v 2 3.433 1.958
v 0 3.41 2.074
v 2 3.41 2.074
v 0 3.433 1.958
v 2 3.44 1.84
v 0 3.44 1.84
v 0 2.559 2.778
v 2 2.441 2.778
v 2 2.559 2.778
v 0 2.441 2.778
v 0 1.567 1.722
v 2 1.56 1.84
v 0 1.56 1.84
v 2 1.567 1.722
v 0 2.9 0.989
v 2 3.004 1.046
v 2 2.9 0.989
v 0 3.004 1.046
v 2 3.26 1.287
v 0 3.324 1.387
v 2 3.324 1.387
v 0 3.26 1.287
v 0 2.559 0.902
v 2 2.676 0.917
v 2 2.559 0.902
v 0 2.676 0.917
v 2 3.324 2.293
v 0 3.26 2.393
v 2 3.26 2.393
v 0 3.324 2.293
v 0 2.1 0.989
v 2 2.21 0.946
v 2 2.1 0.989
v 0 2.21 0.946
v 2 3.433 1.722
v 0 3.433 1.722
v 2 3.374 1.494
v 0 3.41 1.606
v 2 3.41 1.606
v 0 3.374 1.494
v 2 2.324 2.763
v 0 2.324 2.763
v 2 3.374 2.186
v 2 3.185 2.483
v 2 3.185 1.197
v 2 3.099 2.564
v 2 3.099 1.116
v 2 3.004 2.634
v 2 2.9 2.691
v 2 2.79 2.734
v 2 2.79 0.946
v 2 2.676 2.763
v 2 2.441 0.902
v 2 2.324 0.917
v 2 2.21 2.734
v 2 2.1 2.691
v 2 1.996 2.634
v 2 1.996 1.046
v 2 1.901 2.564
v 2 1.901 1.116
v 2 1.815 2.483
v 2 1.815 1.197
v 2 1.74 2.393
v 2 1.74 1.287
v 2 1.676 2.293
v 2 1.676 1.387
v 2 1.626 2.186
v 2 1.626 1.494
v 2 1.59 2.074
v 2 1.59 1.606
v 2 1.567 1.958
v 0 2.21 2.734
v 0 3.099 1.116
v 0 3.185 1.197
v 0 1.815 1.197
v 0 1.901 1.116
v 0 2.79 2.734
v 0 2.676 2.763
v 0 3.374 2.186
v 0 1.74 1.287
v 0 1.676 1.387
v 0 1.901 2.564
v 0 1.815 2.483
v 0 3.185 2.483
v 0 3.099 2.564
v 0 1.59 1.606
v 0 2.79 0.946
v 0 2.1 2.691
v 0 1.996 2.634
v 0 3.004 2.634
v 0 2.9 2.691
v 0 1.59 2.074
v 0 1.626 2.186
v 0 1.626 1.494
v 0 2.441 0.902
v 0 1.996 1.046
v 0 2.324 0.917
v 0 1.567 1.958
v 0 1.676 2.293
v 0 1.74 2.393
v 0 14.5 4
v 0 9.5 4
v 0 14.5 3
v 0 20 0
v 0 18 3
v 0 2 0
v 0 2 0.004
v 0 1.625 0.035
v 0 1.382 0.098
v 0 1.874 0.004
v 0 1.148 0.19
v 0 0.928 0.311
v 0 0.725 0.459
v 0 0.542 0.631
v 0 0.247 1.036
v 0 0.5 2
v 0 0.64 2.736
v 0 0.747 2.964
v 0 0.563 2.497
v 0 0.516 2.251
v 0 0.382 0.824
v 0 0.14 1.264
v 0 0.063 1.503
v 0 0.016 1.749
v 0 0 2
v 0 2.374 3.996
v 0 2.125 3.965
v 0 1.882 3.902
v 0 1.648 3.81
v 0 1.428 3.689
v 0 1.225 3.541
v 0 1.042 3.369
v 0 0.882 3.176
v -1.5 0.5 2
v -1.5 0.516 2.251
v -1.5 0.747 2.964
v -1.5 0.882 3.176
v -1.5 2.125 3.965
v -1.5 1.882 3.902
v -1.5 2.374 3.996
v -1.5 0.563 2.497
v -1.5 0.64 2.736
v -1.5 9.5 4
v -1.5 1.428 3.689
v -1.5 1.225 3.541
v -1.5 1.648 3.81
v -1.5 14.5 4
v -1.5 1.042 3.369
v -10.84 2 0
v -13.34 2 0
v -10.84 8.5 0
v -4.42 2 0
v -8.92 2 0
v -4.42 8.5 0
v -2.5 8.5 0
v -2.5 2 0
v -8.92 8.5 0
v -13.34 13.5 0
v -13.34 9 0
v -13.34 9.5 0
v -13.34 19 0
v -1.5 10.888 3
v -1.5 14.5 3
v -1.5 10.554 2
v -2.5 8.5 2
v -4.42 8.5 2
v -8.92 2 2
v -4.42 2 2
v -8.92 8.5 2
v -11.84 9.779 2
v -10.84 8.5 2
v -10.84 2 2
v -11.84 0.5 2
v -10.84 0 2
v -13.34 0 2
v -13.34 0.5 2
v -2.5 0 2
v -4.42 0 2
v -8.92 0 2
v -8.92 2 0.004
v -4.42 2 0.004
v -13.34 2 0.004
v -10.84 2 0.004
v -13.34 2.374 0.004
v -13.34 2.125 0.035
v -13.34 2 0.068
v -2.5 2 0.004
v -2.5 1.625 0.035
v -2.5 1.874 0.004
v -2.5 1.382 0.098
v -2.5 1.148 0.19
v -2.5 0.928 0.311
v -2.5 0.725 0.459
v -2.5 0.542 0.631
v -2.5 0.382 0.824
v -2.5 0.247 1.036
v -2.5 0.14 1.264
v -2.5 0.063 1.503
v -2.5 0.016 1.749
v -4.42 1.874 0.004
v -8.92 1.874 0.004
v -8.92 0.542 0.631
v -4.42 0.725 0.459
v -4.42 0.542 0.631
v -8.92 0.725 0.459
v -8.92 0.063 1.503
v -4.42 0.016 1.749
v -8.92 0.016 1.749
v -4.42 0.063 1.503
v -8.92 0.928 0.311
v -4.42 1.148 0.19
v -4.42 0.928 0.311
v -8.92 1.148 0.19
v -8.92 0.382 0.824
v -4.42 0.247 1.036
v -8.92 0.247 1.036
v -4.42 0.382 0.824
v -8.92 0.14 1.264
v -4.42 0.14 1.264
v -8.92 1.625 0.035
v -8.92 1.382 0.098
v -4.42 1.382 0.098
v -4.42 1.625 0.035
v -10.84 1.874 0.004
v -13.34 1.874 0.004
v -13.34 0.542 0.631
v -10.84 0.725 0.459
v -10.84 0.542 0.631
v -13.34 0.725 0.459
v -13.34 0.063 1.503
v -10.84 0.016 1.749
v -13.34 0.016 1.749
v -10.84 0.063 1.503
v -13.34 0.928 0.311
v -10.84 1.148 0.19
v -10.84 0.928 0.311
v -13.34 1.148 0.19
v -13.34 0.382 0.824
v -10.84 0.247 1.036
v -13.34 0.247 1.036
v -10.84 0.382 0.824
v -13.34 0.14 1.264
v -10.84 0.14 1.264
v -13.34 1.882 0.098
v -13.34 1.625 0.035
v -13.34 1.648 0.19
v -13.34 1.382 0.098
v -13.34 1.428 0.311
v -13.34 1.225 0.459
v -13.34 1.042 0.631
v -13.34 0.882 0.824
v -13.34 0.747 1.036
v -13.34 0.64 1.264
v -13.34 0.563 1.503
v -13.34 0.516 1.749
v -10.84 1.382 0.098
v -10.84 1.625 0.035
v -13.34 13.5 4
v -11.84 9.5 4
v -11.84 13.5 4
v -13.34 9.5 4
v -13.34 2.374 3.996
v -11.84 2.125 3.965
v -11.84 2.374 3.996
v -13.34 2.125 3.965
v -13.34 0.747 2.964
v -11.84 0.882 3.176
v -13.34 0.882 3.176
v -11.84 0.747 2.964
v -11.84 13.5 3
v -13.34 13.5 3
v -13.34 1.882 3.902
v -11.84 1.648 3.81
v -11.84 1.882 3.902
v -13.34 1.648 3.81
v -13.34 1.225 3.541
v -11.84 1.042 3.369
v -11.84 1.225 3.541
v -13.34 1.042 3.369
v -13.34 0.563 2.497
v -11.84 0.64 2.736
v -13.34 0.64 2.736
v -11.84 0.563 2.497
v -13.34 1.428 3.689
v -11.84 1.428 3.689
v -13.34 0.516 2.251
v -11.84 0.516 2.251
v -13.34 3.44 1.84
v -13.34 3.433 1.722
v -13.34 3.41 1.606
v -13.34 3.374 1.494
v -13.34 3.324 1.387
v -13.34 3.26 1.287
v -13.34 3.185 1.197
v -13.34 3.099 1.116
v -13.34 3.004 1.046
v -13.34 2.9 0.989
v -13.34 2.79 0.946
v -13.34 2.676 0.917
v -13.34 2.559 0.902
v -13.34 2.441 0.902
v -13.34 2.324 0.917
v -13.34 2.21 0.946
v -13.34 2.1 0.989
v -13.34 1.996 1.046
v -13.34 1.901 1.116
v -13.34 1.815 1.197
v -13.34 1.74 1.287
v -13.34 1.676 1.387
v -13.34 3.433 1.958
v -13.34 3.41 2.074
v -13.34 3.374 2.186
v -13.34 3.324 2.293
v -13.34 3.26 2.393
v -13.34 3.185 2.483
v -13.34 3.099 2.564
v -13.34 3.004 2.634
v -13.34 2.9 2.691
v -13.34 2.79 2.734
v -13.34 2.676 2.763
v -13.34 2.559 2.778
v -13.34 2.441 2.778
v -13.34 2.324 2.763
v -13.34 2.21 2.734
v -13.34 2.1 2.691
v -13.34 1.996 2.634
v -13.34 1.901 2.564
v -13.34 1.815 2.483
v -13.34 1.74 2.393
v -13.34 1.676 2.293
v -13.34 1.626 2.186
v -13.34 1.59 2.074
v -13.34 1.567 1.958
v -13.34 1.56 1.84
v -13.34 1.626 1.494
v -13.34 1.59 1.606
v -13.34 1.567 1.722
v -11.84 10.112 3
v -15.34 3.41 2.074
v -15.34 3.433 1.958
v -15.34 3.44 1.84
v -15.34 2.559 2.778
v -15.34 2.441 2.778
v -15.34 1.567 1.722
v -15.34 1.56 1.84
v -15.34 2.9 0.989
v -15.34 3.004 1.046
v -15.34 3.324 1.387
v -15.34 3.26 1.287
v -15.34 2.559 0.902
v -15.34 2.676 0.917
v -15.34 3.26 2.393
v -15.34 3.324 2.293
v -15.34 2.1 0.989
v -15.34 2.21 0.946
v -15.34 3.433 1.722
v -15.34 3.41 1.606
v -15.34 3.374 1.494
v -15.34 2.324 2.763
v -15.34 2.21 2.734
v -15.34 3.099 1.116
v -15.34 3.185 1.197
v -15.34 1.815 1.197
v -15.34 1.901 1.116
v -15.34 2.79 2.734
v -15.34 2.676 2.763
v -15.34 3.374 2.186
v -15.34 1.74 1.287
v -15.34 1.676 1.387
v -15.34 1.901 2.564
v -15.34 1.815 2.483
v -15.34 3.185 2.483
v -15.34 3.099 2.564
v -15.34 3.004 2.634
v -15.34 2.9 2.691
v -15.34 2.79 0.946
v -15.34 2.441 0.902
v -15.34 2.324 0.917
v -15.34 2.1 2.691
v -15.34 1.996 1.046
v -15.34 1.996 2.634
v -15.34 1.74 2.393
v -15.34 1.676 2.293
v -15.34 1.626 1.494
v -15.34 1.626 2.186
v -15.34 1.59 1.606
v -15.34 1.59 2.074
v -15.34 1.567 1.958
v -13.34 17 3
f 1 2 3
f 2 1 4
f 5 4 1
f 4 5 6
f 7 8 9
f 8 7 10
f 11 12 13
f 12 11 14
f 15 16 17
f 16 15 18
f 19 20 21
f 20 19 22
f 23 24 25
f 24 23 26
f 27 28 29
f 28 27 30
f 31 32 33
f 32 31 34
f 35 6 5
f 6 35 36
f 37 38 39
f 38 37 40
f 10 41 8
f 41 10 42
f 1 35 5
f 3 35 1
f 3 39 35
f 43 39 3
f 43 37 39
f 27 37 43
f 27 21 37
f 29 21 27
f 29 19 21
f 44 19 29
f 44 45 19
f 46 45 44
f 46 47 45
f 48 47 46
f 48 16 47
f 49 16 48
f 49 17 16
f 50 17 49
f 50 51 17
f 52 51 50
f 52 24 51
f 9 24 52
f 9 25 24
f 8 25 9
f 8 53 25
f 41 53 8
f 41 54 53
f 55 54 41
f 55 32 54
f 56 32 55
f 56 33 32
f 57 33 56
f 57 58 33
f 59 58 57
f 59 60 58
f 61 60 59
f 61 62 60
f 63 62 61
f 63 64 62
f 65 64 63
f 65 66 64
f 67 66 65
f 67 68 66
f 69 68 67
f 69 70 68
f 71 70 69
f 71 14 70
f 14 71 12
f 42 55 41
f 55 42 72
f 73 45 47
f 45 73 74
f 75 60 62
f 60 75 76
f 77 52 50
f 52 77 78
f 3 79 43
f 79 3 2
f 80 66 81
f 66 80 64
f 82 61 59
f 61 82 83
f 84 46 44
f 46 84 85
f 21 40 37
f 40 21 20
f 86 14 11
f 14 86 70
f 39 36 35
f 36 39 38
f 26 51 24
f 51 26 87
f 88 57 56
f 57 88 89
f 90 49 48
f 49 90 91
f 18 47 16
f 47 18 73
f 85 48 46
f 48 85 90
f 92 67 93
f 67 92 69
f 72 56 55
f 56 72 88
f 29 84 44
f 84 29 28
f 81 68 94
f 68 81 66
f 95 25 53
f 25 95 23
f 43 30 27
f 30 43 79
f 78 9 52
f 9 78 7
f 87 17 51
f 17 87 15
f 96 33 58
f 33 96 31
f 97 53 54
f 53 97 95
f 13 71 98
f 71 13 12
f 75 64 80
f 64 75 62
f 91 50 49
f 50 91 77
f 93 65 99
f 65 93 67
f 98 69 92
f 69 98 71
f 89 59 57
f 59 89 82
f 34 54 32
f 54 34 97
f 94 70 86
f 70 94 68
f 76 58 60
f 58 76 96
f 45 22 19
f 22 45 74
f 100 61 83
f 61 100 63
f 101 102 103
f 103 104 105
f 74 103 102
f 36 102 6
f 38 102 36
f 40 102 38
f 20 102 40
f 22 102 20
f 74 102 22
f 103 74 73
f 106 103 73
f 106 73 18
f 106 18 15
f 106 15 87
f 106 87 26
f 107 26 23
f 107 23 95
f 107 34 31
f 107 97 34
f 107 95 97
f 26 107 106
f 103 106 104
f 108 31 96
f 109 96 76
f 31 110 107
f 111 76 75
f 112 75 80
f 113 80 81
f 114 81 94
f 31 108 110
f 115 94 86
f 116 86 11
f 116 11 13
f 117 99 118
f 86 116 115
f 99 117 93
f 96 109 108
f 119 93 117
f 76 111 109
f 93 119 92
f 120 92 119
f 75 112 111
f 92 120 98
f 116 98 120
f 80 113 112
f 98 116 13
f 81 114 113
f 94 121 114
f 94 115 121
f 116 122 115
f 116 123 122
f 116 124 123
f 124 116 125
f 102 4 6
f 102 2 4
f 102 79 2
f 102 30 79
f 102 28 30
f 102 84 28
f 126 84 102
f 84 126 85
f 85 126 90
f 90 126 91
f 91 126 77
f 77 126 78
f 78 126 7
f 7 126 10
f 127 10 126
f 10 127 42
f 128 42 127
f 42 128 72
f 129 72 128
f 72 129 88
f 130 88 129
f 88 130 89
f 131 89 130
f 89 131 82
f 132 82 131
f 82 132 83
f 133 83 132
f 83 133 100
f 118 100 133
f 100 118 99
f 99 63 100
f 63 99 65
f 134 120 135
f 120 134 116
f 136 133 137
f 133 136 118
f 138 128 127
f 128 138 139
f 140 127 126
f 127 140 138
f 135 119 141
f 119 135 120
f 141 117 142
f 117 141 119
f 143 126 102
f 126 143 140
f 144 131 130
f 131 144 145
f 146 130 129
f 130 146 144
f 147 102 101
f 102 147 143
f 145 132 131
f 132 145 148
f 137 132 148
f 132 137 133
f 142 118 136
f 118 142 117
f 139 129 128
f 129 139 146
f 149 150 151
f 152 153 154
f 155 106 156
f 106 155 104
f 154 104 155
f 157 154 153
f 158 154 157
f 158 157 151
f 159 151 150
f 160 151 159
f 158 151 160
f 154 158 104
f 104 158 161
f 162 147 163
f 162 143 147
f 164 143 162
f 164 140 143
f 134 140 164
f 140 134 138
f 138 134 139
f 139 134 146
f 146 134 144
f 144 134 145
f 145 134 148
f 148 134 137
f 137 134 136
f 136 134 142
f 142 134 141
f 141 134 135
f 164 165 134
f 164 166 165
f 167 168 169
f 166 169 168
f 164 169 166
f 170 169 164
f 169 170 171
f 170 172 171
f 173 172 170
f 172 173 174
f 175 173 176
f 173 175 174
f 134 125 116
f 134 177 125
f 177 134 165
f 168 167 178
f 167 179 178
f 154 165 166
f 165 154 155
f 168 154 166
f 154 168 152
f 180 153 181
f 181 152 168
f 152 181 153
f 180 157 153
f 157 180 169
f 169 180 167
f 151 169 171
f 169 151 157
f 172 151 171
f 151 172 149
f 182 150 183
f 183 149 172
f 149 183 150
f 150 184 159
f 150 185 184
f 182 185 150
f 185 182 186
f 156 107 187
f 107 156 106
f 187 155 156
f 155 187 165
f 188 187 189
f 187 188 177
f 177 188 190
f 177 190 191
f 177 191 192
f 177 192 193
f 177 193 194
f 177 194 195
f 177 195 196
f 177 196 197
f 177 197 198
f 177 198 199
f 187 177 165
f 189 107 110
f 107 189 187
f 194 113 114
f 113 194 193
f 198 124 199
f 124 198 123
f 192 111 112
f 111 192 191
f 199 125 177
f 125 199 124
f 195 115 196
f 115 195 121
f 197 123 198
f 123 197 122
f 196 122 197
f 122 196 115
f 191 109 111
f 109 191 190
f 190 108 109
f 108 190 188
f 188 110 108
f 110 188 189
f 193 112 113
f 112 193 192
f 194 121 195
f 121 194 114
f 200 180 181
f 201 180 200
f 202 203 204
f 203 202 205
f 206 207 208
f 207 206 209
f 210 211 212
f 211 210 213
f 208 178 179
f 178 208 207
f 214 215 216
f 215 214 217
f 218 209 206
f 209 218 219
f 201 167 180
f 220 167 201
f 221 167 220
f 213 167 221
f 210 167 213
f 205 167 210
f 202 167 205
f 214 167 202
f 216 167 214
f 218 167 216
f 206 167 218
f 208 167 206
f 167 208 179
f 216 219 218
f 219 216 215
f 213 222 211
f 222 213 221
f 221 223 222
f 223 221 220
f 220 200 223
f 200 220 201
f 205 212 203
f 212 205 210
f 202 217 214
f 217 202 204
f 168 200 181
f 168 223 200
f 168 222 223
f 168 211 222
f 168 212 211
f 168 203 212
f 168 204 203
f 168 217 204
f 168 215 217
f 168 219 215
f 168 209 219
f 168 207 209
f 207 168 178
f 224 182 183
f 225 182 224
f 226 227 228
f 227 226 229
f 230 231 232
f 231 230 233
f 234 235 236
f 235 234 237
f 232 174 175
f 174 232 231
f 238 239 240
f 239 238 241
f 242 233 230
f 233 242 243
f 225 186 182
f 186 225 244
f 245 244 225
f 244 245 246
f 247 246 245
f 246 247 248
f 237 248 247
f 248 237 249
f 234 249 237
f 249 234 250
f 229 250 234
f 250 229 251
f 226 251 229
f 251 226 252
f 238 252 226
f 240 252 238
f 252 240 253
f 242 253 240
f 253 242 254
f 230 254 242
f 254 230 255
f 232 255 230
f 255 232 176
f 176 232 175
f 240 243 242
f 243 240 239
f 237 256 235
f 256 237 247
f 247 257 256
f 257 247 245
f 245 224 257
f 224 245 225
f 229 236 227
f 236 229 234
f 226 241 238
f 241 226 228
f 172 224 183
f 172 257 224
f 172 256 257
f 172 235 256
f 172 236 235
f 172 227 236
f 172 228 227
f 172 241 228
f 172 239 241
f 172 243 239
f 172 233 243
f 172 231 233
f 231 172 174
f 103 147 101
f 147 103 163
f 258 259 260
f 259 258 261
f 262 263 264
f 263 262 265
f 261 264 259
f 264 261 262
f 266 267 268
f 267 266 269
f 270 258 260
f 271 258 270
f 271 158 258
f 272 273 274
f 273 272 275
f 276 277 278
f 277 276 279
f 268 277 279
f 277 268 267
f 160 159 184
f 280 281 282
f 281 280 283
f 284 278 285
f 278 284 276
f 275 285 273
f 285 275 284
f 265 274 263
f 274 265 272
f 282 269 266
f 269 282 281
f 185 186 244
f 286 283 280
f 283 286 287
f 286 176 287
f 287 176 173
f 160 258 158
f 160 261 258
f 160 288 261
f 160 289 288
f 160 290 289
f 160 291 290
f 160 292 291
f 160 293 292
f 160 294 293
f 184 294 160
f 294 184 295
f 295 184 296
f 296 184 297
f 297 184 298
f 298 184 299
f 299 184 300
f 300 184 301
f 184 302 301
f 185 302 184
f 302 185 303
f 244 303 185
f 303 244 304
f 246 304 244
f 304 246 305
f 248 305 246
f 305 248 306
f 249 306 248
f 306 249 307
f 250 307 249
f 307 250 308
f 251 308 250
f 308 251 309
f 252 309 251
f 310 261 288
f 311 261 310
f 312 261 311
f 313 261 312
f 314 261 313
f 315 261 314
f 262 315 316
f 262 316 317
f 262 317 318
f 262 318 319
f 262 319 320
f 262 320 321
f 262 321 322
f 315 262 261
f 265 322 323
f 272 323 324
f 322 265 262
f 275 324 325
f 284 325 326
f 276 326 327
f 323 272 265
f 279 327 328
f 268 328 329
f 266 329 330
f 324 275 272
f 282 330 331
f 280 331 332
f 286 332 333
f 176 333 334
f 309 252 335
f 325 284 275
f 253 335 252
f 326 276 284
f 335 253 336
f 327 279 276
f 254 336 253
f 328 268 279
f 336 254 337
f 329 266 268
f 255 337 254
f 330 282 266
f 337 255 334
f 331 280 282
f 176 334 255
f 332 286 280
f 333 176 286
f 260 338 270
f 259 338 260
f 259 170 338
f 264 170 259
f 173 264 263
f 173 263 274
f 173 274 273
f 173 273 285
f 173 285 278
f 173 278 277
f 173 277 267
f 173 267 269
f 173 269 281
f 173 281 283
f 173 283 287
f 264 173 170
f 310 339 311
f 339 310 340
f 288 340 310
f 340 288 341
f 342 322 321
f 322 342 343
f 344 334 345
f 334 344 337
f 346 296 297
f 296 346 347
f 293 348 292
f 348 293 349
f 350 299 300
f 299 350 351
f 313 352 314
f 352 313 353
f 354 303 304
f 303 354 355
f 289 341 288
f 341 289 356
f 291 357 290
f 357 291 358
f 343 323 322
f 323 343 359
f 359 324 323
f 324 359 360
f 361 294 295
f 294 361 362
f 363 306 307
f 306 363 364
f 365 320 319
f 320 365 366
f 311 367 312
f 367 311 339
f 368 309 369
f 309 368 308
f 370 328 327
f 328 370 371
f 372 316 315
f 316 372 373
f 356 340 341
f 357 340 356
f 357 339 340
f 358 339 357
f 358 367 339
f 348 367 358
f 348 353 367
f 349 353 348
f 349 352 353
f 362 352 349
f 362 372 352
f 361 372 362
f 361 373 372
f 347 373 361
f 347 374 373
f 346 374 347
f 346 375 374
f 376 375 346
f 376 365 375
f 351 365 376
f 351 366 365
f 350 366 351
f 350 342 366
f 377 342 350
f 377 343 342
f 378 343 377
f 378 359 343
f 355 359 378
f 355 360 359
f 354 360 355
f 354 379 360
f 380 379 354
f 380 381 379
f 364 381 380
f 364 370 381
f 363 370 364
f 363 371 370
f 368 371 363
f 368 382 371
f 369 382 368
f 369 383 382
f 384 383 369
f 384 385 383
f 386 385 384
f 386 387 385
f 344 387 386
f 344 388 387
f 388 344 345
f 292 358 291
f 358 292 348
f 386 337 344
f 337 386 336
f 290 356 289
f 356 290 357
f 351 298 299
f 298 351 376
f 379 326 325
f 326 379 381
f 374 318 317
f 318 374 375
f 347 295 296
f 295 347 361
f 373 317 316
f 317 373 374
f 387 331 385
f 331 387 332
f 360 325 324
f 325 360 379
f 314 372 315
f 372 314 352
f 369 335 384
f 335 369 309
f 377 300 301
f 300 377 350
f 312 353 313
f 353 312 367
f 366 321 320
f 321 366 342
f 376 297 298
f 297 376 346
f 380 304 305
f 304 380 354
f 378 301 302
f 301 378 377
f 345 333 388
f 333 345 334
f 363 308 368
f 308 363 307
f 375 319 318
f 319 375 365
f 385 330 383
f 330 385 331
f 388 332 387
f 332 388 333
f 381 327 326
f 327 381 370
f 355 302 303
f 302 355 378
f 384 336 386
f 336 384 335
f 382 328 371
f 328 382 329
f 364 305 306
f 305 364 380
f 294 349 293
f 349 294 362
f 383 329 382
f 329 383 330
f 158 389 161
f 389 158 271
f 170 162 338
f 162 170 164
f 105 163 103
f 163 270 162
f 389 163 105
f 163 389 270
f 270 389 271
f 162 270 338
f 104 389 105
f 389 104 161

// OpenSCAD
// file: ../../../common/circle_sector.scad
module circle_sector(r = 0, d = 0, a = [0, 180]) {
    r = max(r, d / 2);
    sector_r = r / cos(180 / $fn);
    step = -360 / $fn;

    points = concat([[0, 0]],
        [for(a = [a[0] : step : a[1] - 360])
            [sector_r * cos(a), sector_r * sin(a)]
        ],
        [[sector_r * cos(a[1]), sector_r * sin(a[1])]]
    );

    difference() {
        circle(r);
        polygon(points);
    }
}

circle_sector();
// file: lenovo_trackpoint_II_keyboard_foldable_foot.scad
use <../../../common/circle_sector.scad>;
function body_width() = 13.34; // mm, without the shafts on the shaft arm

function body_bottom_length_1() = 19.0; // the end tip is a slightly angled wedge shape
function body_bottom_length_2() = 20.0;
function body_top_length_1() = 16.5;
function body_top_length_2() = 17.5;
function body_paralelogram_factor() = 1.0; // mm, the body has paralelogram shape, the top is offset by this amount

function tip_height() = 3.0;
function tip_bottom_length_1() = 10.0;
function tip_bottom_length_2() = 11.0;
function tip_wedge_factor() = 2.0;
function body_wedge_factor() = 1.0;

function tip_top_length_1() = tip_bottom_length_1() - tip_wedge_factor();
function tip_top_length_2() = tip_bottom_length_2() - tip_wedge_factor();

function body_offset_y() = 9.0;

module main_body_with_tip() {
    // counter-clockwise order, bottom 4 points, then top 4 points
    CubePoints = [
            // bottom
            [0, body_paralelogram_factor(), 0], // 0, bottom - left-down corner
            [body_width(), 0, 0], //1 bottom - right-down corner
            [body_width(), tip_bottom_length_1(), 0], //2 bottom - right-up corner
            [0, tip_bottom_length_2(), 0], //3 bottom - left-up corner

            // top
            [0, body_paralelogram_factor() + body_wedge_factor(), tip_height()], //4 top - left-down corner
            [body_width(), body_wedge_factor(), tip_height()], //5 top - right-down corner
            [body_width(), tip_top_length_1(), tip_height()], //6 top - right-up corner
            [0, tip_top_length_2(), tip_height()] //7 top - left-up corner
        ];

    CubeFaces = [
            [0, 1, 2, 3], // bottom
            [4, 5, 1, 0], // front
            [7, 6, 5, 4], // top
            [5, 6, 2, 1], // right
            [6, 7, 3, 2], // back
            [7, 4, 0, 3] // left
        ];

    polyhedron(CubePoints, CubeFaces);
}

function spring_arm_height() = 2.0; // this is the thinnest part

function spring_arm_center_width() = 4.5;
function spring_arm_side_width() = 2.5;

function spring_arm_cutaway_depth() = 8.5;
function spring_arm_cutaway_width() = 1.92;
function spring_arm_depth_top_1() = 10.0;
function spring_arm_length_short() = 10.0;
function spring_arm_length_long() = 11.0;
function spring_arm_end_curve_r() = spring_arm_height();

module spring_arm() {
    total_width = spring_arm_side_width() * 2 + spring_arm_cutaway_width() * 2 + spring_arm_center_width();
    echo("total_width = ", total_width);
    l_short = spring_arm_length_short() - spring_arm_end_curve_r();
    l_long = spring_arm_length_long() - spring_arm_end_curve_r();
    cutaway_l = spring_arm_cutaway_depth() - spring_arm_end_curve_r();

    center_spring_offset_x = spring_arm_side_width() + spring_arm_cutaway_width();
    side_spring_offset_x = total_width - spring_arm_side_width();

    union() {
        translate([0, spring_arm_height(), 0]) linear_extrude(spring_arm_height())
            polygon(
            points = [
                    [0, 0],
                    [0, l_long],
                    [total_width, l_long],
                    [total_width, 0],
                    [total_width - spring_arm_side_width(), 0],
                    [total_width - spring_arm_side_width(), cutaway_l],
                    [total_width / 2 + spring_arm_center_width() / 2, cutaway_l],
                    [total_width / 2 + spring_arm_center_width() / 2, 0],
                    [total_width / 2 - spring_arm_center_width() / 2, 0],
                    [total_width / 2 - spring_arm_center_width() / 2, cutaway_l],
                    [spring_arm_side_width(), cutaway_l],
                    [spring_arm_side_width(), 0],
                ]
            );

        translate([0, spring_arm_end_curve_r(), spring_arm_end_curve_r()]) rotate([-90, 0, -90]) linear_extrude(
        spring_arm_side_width()) circle_sector(r = spring_arm_end_curve_r(), a = [0, 90]);
        translate([center_spring_offset_x, spring_arm_end_curve_r(), spring_arm_end_curve_r()]) rotate([-90, 0, -90])
            linear_extrude(spring_arm_center_width()) circle_sector(r = spring_arm_end_curve_r(), a = [0, 90]);
        translate([side_spring_offset_x, spring_arm_end_curve_r(), spring_arm_end_curve_r()]) rotate([-90, 0, -90])
            linear_extrude(spring_arm_side_width()) circle_sector(r = spring_arm_end_curve_r(), a = [0, 90]);
    }
}

function shaft_diameter() = 1.88;
function shaft_length() = 2.0;
function shaft_offset_from_bottom() = 0.9;
function shaft_arm_height() = 4.0; // this is the thickest part
function shaft_arm_width() = 1.5;
function shaft_arm_length_short() = 9.0;
function shaft_arm_length_long() = 10.0;
function shaft_arm_end_top_curve_r() = 2.0;
//function shaft_arm_end_bottom_curve_r() = 1.0;
function shaft_arm_end_offset_from_spring_arm_end() = 0.5;
function shaft_arm_chop_off_height() = 1; // mm

module shaft_arm(l = shaft_arm_length_short(), shaft_side = "left") {
    translate([0, shaft_arm_end_top_curve_r() + shaft_arm_end_offset_from_spring_arm_end(), 0])
    rotate([90, 0, 90])
    union() {
        linear_extrude(shaft_arm_width()) {
            hull() {
                translate([0, shaft_arm_end_top_curve_r()]) circle(r = shaft_arm_end_top_curve_r());
                translate([l - shaft_arm_height() / 2, 0]) square(shaft_arm_height());
            }
        }
        if (shaft_side == "left") {
            difference() {
                translate([0, shaft_diameter() / 2 + shaft_offset_from_bottom(), - shaft_length()]) cylinder(d=shaft_diameter(), h=shaft_length());
                cube(shaft_diameter() * 2);
            }
        } else {
            translate([0, shaft_diameter() / 2 + shaft_offset_from_bottom(), shaft_arm_width()]) cylinder(d=shaft_diameter(), h=shaft_length());
        }
    }
}

module foot_left_without_text() {
    union() {
        shaft_arm();
        spring_arm();
        shaft_arm(l = shaft_arm_length_long(), shaft_side = "left");
        translate([body_width() - shaft_arm_width(), 0 ,0]) shaft_arm(l = shaft_arm_length_short(), shaft_side = "right");
        translate([0, body_offset_y(), 0]) main_body_with_tip();
    }
}

module foot_right_without_text() {
    mirror([1, 0, 0]) foot_left_without_text();
}

$fn = 50;
color("red") foot_left_without_text();
color("green") translate([50, 0, 0]) foot_right_without_text();
// main file
use <lenovo_trackpoint_II_keyboard_foldable_foot.scad>

$fn=50;
color("green") foot_right_without_text();
